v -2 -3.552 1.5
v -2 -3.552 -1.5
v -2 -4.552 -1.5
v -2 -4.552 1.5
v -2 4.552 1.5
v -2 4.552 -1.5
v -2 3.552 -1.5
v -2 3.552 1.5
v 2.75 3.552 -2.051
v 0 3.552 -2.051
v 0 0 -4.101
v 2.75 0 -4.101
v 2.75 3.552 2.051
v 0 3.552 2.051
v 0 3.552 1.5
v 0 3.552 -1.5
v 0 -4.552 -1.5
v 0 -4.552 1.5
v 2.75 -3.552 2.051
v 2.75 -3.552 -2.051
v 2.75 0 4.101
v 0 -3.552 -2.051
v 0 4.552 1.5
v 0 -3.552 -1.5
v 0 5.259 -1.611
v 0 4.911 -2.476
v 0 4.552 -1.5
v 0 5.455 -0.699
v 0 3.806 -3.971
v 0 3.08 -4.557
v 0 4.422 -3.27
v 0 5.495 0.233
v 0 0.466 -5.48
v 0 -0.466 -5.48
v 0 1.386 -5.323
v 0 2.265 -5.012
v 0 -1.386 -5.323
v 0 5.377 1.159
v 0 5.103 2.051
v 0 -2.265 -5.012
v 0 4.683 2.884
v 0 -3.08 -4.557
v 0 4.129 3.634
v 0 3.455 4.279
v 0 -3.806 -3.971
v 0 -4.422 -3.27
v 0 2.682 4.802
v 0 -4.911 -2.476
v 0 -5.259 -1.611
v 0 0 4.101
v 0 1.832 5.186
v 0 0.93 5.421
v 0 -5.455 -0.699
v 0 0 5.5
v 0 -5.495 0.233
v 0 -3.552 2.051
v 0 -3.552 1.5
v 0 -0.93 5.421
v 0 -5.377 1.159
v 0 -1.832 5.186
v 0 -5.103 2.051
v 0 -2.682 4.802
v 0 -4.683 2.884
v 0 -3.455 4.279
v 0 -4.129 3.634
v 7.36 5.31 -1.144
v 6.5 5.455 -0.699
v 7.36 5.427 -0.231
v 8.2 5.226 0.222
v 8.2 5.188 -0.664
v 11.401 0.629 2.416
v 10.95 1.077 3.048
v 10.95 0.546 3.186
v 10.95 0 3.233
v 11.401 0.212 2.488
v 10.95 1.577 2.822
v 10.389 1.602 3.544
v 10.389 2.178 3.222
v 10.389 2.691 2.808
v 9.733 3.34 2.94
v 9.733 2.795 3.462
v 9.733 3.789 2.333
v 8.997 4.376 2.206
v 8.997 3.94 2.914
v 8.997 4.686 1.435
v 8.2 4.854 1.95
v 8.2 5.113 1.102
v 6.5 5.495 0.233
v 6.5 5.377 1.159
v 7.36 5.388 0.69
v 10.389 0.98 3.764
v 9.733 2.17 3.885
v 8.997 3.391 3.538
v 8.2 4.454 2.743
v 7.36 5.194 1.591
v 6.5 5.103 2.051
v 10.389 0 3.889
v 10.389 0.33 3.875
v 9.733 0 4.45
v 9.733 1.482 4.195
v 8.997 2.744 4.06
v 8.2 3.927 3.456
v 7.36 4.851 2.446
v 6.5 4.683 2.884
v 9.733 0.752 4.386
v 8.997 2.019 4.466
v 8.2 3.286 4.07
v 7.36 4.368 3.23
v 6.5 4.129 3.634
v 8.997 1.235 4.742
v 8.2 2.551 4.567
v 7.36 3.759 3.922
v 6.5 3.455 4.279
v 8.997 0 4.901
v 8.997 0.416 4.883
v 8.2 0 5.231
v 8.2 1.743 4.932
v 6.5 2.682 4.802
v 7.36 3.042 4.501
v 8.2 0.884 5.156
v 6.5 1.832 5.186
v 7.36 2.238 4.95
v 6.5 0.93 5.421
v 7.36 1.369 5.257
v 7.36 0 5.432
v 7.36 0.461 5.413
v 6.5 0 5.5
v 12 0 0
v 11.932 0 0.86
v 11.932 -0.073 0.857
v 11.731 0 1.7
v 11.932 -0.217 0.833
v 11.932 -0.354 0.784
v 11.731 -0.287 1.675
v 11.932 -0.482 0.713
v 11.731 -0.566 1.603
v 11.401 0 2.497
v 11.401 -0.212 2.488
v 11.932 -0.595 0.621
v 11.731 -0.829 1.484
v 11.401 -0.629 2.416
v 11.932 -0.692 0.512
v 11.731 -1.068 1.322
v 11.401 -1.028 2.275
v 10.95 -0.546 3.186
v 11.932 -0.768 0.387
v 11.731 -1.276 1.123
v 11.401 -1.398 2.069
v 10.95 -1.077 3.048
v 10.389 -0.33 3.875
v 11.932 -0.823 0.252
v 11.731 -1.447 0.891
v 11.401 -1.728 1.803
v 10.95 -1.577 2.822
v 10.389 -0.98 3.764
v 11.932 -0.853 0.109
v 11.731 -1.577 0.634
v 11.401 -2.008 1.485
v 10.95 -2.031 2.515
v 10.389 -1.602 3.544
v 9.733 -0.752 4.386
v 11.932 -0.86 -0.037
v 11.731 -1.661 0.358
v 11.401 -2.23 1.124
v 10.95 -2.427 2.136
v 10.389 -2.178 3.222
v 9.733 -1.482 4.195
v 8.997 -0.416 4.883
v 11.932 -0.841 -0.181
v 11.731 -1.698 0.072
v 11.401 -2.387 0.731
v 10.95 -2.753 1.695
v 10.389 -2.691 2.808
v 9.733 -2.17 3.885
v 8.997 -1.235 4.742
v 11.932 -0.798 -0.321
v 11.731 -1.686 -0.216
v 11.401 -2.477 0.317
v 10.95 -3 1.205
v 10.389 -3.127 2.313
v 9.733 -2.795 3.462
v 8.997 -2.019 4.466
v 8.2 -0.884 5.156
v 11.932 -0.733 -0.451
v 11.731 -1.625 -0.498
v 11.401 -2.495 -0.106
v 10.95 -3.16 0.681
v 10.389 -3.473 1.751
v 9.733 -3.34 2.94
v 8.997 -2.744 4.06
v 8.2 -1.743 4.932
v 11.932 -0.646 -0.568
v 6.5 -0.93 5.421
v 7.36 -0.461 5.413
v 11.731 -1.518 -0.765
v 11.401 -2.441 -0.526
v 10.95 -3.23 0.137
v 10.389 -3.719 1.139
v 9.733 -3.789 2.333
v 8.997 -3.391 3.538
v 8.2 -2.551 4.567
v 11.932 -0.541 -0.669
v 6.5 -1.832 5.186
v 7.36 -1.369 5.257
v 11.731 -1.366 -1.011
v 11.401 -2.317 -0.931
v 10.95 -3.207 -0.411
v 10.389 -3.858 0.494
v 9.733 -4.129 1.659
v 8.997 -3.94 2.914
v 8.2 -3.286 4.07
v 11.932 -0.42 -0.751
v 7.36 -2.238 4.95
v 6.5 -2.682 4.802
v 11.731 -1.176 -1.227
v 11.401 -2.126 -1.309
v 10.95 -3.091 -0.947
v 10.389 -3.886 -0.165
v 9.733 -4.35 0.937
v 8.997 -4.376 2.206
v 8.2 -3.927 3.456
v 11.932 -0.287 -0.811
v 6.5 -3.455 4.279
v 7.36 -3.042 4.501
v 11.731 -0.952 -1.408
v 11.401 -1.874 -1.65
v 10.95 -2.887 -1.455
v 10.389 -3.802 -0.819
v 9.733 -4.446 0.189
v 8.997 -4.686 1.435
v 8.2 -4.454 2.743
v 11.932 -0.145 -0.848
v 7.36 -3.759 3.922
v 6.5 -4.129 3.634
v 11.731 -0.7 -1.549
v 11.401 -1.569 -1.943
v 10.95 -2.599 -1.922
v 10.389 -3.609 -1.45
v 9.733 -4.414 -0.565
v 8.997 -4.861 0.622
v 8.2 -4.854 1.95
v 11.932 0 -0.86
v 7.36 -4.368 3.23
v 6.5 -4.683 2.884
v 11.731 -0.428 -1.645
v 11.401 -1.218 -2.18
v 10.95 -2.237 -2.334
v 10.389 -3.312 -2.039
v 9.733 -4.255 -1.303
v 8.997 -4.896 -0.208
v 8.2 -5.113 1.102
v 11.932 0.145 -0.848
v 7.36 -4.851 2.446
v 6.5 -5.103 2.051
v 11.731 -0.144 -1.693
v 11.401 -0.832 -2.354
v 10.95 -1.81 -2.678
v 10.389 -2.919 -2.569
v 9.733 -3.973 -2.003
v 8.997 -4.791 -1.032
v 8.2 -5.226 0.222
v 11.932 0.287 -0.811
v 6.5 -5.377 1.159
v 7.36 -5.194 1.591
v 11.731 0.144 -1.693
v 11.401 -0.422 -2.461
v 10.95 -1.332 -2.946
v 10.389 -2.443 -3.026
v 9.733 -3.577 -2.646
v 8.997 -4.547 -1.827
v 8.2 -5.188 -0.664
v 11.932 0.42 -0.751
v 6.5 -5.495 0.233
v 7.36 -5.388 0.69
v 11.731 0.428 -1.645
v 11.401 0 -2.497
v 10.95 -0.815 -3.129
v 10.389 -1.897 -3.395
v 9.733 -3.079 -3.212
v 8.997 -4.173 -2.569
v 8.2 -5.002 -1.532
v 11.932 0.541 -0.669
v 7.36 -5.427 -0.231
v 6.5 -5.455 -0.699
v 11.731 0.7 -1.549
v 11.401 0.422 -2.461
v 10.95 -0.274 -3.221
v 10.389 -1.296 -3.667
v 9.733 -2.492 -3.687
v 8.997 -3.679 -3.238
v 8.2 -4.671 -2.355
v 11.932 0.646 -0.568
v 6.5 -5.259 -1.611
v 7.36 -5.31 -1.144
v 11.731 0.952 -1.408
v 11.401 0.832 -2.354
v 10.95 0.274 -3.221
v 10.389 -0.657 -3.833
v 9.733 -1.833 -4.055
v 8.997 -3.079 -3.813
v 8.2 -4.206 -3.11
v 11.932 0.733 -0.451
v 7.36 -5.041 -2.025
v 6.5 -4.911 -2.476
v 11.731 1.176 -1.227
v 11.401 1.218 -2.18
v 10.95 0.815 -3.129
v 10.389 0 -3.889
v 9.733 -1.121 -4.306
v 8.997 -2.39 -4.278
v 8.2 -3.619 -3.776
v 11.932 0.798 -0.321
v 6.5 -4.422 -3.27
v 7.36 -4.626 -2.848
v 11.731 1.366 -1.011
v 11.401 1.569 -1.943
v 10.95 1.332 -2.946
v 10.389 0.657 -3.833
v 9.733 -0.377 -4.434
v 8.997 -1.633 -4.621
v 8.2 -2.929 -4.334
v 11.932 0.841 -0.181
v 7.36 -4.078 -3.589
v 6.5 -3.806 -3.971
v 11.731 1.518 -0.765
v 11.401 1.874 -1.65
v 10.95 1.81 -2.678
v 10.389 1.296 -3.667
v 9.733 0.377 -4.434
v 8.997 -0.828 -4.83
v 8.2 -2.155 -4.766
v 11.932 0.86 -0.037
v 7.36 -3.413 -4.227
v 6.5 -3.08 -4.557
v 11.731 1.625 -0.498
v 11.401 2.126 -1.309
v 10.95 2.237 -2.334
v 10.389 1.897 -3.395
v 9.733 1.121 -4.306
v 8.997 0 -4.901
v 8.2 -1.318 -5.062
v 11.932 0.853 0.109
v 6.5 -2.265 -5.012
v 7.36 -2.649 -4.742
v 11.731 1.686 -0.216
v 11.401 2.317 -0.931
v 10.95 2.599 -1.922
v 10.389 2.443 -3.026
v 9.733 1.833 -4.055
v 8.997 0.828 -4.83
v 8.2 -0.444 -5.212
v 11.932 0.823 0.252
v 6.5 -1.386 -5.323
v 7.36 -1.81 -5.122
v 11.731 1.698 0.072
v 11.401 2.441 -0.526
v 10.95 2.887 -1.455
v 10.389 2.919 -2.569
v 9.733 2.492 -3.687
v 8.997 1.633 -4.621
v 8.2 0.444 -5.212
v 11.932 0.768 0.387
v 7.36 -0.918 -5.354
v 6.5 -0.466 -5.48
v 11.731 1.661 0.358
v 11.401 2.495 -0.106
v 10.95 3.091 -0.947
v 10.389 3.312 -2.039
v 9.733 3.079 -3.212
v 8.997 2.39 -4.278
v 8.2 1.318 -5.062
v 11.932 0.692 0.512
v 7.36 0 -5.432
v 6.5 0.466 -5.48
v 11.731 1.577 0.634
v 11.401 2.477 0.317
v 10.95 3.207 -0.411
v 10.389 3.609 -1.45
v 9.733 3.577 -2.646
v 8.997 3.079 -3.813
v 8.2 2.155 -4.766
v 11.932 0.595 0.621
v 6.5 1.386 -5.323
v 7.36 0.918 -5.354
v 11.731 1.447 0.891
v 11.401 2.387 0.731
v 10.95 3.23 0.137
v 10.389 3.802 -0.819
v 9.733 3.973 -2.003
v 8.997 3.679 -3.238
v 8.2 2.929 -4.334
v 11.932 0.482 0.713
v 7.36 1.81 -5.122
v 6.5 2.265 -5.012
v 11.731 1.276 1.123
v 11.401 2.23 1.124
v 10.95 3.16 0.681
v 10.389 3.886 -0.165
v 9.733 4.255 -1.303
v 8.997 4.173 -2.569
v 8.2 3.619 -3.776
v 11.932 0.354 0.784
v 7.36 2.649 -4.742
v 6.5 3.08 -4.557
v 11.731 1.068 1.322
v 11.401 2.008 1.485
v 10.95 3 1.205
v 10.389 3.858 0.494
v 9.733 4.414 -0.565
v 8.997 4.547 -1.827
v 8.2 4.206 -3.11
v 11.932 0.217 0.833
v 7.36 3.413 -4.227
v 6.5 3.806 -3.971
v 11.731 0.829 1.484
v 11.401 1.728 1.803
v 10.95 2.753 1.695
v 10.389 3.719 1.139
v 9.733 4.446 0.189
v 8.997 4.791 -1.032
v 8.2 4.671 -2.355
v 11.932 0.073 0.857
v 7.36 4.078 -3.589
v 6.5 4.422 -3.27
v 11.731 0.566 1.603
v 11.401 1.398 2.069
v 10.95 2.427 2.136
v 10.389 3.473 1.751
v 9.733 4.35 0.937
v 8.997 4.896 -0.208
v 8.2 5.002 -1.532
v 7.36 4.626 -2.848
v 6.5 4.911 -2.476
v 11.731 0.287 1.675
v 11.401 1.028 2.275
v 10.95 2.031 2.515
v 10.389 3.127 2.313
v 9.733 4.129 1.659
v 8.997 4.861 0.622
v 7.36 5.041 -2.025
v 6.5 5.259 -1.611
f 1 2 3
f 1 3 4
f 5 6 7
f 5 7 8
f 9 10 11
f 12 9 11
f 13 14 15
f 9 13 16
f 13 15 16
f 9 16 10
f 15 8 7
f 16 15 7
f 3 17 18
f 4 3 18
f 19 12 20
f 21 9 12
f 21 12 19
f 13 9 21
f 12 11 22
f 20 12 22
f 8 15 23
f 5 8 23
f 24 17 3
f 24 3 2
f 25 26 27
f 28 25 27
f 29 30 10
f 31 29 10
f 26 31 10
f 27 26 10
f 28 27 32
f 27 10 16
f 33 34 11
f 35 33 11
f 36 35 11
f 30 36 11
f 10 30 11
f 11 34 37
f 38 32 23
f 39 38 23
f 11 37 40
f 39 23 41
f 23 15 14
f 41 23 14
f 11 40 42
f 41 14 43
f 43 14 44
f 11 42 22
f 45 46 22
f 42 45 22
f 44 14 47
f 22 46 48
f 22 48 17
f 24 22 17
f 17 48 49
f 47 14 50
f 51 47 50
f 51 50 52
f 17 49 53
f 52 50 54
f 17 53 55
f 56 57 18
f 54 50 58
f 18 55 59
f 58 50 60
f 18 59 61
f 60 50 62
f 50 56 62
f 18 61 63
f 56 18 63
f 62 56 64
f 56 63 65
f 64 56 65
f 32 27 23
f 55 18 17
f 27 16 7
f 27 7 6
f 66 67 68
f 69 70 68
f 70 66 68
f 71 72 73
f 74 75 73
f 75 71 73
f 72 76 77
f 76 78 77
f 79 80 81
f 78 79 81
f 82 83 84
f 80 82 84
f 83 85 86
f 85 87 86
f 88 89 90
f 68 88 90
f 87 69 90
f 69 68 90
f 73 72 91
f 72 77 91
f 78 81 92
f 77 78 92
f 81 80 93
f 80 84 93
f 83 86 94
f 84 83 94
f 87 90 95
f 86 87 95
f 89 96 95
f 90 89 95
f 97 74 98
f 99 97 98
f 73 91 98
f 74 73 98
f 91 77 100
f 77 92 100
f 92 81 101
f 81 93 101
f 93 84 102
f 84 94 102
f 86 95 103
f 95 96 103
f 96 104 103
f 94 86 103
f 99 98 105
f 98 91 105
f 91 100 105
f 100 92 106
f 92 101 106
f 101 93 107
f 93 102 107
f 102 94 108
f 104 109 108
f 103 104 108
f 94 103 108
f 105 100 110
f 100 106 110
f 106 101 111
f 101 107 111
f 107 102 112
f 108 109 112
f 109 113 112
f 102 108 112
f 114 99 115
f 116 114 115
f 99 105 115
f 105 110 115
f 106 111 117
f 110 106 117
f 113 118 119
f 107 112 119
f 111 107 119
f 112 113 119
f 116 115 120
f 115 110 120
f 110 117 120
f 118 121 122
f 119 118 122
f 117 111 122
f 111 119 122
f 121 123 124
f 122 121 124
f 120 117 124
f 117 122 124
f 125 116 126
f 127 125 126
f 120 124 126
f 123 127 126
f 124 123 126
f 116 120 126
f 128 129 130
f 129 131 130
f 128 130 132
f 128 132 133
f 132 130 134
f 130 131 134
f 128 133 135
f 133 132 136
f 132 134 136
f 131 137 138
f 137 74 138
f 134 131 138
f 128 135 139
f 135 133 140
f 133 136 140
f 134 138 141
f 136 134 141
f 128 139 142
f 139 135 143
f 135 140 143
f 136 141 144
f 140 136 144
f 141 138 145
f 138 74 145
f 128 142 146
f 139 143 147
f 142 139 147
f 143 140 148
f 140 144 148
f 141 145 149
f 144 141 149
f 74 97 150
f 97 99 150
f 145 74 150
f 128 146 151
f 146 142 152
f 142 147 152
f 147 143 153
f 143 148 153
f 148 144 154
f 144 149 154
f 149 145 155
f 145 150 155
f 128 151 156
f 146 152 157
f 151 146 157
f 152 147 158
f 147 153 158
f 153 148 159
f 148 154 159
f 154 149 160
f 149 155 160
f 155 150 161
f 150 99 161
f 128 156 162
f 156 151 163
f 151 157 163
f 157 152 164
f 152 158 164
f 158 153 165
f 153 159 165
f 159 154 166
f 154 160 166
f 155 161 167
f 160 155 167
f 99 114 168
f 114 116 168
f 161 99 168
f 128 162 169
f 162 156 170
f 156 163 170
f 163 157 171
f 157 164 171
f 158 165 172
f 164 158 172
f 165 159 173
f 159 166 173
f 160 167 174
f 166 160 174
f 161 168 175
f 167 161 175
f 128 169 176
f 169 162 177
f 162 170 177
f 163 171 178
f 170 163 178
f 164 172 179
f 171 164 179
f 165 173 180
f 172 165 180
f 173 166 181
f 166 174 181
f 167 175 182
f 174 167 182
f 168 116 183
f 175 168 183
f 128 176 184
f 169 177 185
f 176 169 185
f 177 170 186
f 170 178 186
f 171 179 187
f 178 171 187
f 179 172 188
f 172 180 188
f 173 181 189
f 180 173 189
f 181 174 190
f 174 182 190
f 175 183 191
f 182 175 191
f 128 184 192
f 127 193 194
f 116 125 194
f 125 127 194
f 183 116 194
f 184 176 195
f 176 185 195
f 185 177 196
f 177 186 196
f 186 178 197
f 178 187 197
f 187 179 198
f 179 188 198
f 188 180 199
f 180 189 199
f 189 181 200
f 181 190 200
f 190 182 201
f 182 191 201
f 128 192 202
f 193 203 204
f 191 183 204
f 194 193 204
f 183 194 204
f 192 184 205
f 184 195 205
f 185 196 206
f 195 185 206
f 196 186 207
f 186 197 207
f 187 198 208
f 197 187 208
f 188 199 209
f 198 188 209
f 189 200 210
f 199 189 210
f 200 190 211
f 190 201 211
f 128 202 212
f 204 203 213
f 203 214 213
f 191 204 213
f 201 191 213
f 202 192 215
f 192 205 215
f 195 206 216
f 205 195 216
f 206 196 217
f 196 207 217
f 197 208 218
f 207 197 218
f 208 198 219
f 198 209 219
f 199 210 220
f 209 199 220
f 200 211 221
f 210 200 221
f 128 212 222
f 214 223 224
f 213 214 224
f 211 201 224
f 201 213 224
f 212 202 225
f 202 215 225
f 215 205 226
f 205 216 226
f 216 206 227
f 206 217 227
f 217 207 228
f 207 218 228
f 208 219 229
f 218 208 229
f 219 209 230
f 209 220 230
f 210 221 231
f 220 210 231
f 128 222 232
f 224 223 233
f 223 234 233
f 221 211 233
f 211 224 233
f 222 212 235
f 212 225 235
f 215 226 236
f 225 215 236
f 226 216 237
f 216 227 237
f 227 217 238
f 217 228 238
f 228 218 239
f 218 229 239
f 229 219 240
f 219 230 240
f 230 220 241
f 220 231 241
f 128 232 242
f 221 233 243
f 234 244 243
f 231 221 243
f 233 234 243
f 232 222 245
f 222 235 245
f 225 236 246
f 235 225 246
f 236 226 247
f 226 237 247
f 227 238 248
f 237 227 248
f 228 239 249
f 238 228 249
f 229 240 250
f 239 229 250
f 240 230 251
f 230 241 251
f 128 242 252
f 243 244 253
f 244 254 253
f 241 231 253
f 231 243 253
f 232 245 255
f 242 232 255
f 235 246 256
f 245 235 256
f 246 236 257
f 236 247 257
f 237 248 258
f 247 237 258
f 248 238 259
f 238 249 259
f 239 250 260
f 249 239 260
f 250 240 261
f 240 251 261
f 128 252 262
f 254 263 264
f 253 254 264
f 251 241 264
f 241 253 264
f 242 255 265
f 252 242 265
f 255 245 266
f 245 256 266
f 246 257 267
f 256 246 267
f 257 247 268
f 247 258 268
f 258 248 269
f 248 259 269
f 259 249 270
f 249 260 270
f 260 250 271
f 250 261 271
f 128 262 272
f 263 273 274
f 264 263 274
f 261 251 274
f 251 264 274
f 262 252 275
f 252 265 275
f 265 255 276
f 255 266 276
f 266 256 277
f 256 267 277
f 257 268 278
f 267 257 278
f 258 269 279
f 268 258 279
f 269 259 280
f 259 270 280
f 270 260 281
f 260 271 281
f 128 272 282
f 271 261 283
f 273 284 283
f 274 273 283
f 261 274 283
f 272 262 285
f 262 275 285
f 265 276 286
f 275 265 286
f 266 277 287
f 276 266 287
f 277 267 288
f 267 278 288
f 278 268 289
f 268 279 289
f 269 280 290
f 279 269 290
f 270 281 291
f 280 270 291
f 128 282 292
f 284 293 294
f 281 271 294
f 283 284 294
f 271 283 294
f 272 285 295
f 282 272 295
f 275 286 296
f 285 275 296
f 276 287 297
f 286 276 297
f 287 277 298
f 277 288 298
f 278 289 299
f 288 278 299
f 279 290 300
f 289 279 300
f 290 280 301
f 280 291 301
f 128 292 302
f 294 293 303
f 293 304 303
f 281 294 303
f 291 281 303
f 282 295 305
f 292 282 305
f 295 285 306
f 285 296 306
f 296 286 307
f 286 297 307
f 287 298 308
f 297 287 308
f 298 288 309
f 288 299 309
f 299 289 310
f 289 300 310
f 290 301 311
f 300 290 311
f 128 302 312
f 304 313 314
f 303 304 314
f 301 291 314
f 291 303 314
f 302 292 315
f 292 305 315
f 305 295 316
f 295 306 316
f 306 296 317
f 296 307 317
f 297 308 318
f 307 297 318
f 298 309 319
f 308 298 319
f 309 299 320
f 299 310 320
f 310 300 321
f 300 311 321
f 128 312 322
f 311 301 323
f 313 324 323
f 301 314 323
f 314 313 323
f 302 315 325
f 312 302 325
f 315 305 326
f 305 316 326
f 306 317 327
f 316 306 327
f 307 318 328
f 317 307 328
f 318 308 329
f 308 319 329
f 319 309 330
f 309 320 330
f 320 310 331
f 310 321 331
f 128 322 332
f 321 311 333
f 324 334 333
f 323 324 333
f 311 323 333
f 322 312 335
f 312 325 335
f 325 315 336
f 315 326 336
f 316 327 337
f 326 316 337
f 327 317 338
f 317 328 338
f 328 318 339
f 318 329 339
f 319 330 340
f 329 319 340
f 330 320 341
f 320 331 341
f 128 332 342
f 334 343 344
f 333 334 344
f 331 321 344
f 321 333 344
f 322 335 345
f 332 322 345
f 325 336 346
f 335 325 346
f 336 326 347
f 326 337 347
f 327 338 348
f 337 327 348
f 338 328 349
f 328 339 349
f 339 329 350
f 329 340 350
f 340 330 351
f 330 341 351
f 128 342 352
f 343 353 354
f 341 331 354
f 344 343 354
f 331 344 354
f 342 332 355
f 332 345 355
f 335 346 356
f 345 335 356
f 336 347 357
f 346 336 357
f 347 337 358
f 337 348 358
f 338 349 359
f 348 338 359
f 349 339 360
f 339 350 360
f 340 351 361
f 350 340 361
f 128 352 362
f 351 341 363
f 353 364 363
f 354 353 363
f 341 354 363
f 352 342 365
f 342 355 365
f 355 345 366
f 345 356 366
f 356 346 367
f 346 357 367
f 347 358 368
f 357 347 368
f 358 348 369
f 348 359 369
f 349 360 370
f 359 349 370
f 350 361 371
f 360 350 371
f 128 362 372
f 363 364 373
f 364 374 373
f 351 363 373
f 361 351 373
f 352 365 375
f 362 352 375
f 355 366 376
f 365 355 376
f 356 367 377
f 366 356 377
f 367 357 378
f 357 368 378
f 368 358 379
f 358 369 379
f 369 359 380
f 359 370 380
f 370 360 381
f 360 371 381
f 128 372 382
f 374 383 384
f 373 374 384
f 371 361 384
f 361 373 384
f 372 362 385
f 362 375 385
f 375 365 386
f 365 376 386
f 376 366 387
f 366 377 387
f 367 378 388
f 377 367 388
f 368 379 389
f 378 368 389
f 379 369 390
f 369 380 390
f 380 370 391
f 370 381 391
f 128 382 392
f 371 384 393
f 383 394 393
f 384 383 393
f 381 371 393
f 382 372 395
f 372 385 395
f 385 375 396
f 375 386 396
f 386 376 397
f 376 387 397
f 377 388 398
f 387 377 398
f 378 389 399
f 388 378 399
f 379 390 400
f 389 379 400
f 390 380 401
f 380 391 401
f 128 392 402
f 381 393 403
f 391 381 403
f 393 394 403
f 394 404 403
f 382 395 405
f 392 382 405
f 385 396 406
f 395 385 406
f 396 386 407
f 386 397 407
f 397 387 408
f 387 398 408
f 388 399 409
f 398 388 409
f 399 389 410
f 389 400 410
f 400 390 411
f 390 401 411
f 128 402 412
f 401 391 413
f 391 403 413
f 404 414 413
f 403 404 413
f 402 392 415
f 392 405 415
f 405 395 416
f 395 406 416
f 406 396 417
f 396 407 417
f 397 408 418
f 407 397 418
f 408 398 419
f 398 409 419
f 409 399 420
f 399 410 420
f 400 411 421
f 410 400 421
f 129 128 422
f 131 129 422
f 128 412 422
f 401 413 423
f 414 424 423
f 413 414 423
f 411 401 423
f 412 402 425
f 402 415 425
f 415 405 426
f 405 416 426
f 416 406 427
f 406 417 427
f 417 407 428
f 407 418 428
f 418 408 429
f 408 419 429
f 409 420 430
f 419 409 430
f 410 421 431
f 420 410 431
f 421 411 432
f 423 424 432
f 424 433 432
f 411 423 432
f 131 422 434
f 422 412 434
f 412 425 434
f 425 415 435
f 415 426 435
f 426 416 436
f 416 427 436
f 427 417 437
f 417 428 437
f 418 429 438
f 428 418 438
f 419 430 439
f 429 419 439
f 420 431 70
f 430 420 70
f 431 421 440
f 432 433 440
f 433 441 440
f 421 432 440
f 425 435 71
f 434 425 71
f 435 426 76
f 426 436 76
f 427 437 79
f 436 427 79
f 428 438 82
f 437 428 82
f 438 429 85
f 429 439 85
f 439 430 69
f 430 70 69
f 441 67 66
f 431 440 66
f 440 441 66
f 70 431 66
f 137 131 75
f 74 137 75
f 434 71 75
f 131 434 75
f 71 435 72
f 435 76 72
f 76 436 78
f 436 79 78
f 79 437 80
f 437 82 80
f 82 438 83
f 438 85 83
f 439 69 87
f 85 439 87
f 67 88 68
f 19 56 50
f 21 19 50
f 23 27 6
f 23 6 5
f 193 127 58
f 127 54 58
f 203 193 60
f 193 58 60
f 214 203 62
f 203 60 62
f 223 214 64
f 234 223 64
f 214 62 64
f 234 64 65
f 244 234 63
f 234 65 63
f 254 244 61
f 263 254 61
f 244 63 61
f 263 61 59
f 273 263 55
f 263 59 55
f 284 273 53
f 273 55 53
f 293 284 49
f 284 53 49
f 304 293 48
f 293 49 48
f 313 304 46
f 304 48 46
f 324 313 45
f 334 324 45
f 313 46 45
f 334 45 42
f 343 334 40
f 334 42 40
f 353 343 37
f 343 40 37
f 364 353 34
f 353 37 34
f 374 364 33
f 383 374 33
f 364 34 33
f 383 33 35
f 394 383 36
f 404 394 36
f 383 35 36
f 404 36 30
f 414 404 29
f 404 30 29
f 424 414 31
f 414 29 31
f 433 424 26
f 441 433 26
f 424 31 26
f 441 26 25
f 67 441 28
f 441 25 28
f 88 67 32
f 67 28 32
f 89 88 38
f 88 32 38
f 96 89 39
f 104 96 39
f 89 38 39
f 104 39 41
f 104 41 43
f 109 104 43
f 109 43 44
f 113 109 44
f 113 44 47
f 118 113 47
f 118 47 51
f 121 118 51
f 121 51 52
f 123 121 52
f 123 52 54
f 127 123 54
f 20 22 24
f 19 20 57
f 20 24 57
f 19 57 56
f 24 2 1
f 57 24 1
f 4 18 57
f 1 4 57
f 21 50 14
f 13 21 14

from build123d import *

# Parameters (mm, degrees)
CUT_EXTRUDE1_DEPTH  = 2.75
SKETCH5_W           = 3
SKETCH5_H           = 1
BOSS_EXTRUDE2_DEPTH = 2


with BuildPart() as part:
    # Sketch1 → Revolve1 (revolve)
    with BuildSketch(Plane.XY, mode=Mode.PRIVATE) as revolve1_sk:
        with BuildLine():
            Line((0, 0), (12, 0))
            ThreePointArc((12, 0), (10.389087297, -3.889087297), (6.5, -5.5))
            Line((6.5, -5.5), (0, -5.5))
            Line((0, -5.5), (0, 0))
        make_face()
    revolve(revolve1_sk.sketch.rotate(Axis((0, 0, 0), (1, 0, 0)), 270), axis=Axis((0, 0, 0), (1, 0, 0)))

    # Sketch2 → Cut-Extrude1 (cut)
    with BuildSketch(Plane.ZY):
        Polygon((2.050748156, 3.552), (-2.050748156, 3.552), (-4.101496312, 0), (-2.050748156, -3.552), (2.050748156, -3.552), (4.101496312, 0), align=None)
    extrude(amount=-CUT_EXTRUDE1_DEPTH, mode=Mode.SUBTRACT)

    # Sketch5 → Boss-Extrude2 (add)
    with BuildSketch(Plane.ZY):
        with Locations((0, 4.052)):
            Rectangle(SKETCH5_W, SKETCH5_H)
        with Locations((0, -4.052)):
            Rectangle(SKETCH5_W, SKETCH5_H)
    extrude(amount=BOSS_EXTRUDE2_DEPTH)


solid = part.part
